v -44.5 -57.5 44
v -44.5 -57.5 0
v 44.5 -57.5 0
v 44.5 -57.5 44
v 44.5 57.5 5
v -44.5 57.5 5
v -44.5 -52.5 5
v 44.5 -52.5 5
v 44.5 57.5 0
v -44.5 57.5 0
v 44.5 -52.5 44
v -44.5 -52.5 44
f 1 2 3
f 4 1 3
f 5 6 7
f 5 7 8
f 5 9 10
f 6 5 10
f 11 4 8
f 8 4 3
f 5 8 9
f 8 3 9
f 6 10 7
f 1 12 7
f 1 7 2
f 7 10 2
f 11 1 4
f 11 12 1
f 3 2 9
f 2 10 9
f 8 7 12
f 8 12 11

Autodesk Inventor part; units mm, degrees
ref_plane "YZ Plane" through (0, 0, 0) normal (1, 0, 0) x (0, 1, 0)
ref_plane "XZ Plane" through (0, 0, 0) normal (0, 1, 0) x (-1, 0, 0)
ref_plane "XY Plane" through (0, 0, 0) normal (0, 0, 1) x (1, 0, 0)
sketch "Sketch1" plane through (0, 0, 0) normal (0, 0, 1) x (1, 0, 0)
  line L0 (44.5, 57.5) -> (-44.5, 57.5)
  line L1 (-44.5, 57.5) -> (-44.5, -57.5)
  line L2 (-44.5, -57.5) -> (44.5, -57.5)
  line L3 (44.5, -57.5) -> (44.5, 57.5)
  point P0 (0, 0)
  dimension "d0" = 89
  dimension "d3" = 115
  dimension "d4" = 57.5
  dimension "d5" = 44.5
extrude "Extrusion1" add sketch "Sketch1" along normal blind 5
sketch "Sketch2" plane through (0, 0, 5) normal (0, 0, 1) x (1, 0, 0)
  line L0 (-44.5, -52.5) -> (44.5, -52.5)
  line L1 (44.5, -52.5) -> (44.5, -57.5)
  line L2 (44.5, -57.5) -> (-44.5, -57.5)
  line L3 (-44.5, -57.5) -> (-44.5, -52.5)
  point P0 (0, 0)
  dimension "d8" = 89
  dimension "d9" = 5
extrude "Extrusion2" add sketch "Sketch2" along normal blind 39
equation "\"d4\" = 0.5 * d3"
equation "\"d5\" = 0.5 * d0"
properties part number "back_plate"
